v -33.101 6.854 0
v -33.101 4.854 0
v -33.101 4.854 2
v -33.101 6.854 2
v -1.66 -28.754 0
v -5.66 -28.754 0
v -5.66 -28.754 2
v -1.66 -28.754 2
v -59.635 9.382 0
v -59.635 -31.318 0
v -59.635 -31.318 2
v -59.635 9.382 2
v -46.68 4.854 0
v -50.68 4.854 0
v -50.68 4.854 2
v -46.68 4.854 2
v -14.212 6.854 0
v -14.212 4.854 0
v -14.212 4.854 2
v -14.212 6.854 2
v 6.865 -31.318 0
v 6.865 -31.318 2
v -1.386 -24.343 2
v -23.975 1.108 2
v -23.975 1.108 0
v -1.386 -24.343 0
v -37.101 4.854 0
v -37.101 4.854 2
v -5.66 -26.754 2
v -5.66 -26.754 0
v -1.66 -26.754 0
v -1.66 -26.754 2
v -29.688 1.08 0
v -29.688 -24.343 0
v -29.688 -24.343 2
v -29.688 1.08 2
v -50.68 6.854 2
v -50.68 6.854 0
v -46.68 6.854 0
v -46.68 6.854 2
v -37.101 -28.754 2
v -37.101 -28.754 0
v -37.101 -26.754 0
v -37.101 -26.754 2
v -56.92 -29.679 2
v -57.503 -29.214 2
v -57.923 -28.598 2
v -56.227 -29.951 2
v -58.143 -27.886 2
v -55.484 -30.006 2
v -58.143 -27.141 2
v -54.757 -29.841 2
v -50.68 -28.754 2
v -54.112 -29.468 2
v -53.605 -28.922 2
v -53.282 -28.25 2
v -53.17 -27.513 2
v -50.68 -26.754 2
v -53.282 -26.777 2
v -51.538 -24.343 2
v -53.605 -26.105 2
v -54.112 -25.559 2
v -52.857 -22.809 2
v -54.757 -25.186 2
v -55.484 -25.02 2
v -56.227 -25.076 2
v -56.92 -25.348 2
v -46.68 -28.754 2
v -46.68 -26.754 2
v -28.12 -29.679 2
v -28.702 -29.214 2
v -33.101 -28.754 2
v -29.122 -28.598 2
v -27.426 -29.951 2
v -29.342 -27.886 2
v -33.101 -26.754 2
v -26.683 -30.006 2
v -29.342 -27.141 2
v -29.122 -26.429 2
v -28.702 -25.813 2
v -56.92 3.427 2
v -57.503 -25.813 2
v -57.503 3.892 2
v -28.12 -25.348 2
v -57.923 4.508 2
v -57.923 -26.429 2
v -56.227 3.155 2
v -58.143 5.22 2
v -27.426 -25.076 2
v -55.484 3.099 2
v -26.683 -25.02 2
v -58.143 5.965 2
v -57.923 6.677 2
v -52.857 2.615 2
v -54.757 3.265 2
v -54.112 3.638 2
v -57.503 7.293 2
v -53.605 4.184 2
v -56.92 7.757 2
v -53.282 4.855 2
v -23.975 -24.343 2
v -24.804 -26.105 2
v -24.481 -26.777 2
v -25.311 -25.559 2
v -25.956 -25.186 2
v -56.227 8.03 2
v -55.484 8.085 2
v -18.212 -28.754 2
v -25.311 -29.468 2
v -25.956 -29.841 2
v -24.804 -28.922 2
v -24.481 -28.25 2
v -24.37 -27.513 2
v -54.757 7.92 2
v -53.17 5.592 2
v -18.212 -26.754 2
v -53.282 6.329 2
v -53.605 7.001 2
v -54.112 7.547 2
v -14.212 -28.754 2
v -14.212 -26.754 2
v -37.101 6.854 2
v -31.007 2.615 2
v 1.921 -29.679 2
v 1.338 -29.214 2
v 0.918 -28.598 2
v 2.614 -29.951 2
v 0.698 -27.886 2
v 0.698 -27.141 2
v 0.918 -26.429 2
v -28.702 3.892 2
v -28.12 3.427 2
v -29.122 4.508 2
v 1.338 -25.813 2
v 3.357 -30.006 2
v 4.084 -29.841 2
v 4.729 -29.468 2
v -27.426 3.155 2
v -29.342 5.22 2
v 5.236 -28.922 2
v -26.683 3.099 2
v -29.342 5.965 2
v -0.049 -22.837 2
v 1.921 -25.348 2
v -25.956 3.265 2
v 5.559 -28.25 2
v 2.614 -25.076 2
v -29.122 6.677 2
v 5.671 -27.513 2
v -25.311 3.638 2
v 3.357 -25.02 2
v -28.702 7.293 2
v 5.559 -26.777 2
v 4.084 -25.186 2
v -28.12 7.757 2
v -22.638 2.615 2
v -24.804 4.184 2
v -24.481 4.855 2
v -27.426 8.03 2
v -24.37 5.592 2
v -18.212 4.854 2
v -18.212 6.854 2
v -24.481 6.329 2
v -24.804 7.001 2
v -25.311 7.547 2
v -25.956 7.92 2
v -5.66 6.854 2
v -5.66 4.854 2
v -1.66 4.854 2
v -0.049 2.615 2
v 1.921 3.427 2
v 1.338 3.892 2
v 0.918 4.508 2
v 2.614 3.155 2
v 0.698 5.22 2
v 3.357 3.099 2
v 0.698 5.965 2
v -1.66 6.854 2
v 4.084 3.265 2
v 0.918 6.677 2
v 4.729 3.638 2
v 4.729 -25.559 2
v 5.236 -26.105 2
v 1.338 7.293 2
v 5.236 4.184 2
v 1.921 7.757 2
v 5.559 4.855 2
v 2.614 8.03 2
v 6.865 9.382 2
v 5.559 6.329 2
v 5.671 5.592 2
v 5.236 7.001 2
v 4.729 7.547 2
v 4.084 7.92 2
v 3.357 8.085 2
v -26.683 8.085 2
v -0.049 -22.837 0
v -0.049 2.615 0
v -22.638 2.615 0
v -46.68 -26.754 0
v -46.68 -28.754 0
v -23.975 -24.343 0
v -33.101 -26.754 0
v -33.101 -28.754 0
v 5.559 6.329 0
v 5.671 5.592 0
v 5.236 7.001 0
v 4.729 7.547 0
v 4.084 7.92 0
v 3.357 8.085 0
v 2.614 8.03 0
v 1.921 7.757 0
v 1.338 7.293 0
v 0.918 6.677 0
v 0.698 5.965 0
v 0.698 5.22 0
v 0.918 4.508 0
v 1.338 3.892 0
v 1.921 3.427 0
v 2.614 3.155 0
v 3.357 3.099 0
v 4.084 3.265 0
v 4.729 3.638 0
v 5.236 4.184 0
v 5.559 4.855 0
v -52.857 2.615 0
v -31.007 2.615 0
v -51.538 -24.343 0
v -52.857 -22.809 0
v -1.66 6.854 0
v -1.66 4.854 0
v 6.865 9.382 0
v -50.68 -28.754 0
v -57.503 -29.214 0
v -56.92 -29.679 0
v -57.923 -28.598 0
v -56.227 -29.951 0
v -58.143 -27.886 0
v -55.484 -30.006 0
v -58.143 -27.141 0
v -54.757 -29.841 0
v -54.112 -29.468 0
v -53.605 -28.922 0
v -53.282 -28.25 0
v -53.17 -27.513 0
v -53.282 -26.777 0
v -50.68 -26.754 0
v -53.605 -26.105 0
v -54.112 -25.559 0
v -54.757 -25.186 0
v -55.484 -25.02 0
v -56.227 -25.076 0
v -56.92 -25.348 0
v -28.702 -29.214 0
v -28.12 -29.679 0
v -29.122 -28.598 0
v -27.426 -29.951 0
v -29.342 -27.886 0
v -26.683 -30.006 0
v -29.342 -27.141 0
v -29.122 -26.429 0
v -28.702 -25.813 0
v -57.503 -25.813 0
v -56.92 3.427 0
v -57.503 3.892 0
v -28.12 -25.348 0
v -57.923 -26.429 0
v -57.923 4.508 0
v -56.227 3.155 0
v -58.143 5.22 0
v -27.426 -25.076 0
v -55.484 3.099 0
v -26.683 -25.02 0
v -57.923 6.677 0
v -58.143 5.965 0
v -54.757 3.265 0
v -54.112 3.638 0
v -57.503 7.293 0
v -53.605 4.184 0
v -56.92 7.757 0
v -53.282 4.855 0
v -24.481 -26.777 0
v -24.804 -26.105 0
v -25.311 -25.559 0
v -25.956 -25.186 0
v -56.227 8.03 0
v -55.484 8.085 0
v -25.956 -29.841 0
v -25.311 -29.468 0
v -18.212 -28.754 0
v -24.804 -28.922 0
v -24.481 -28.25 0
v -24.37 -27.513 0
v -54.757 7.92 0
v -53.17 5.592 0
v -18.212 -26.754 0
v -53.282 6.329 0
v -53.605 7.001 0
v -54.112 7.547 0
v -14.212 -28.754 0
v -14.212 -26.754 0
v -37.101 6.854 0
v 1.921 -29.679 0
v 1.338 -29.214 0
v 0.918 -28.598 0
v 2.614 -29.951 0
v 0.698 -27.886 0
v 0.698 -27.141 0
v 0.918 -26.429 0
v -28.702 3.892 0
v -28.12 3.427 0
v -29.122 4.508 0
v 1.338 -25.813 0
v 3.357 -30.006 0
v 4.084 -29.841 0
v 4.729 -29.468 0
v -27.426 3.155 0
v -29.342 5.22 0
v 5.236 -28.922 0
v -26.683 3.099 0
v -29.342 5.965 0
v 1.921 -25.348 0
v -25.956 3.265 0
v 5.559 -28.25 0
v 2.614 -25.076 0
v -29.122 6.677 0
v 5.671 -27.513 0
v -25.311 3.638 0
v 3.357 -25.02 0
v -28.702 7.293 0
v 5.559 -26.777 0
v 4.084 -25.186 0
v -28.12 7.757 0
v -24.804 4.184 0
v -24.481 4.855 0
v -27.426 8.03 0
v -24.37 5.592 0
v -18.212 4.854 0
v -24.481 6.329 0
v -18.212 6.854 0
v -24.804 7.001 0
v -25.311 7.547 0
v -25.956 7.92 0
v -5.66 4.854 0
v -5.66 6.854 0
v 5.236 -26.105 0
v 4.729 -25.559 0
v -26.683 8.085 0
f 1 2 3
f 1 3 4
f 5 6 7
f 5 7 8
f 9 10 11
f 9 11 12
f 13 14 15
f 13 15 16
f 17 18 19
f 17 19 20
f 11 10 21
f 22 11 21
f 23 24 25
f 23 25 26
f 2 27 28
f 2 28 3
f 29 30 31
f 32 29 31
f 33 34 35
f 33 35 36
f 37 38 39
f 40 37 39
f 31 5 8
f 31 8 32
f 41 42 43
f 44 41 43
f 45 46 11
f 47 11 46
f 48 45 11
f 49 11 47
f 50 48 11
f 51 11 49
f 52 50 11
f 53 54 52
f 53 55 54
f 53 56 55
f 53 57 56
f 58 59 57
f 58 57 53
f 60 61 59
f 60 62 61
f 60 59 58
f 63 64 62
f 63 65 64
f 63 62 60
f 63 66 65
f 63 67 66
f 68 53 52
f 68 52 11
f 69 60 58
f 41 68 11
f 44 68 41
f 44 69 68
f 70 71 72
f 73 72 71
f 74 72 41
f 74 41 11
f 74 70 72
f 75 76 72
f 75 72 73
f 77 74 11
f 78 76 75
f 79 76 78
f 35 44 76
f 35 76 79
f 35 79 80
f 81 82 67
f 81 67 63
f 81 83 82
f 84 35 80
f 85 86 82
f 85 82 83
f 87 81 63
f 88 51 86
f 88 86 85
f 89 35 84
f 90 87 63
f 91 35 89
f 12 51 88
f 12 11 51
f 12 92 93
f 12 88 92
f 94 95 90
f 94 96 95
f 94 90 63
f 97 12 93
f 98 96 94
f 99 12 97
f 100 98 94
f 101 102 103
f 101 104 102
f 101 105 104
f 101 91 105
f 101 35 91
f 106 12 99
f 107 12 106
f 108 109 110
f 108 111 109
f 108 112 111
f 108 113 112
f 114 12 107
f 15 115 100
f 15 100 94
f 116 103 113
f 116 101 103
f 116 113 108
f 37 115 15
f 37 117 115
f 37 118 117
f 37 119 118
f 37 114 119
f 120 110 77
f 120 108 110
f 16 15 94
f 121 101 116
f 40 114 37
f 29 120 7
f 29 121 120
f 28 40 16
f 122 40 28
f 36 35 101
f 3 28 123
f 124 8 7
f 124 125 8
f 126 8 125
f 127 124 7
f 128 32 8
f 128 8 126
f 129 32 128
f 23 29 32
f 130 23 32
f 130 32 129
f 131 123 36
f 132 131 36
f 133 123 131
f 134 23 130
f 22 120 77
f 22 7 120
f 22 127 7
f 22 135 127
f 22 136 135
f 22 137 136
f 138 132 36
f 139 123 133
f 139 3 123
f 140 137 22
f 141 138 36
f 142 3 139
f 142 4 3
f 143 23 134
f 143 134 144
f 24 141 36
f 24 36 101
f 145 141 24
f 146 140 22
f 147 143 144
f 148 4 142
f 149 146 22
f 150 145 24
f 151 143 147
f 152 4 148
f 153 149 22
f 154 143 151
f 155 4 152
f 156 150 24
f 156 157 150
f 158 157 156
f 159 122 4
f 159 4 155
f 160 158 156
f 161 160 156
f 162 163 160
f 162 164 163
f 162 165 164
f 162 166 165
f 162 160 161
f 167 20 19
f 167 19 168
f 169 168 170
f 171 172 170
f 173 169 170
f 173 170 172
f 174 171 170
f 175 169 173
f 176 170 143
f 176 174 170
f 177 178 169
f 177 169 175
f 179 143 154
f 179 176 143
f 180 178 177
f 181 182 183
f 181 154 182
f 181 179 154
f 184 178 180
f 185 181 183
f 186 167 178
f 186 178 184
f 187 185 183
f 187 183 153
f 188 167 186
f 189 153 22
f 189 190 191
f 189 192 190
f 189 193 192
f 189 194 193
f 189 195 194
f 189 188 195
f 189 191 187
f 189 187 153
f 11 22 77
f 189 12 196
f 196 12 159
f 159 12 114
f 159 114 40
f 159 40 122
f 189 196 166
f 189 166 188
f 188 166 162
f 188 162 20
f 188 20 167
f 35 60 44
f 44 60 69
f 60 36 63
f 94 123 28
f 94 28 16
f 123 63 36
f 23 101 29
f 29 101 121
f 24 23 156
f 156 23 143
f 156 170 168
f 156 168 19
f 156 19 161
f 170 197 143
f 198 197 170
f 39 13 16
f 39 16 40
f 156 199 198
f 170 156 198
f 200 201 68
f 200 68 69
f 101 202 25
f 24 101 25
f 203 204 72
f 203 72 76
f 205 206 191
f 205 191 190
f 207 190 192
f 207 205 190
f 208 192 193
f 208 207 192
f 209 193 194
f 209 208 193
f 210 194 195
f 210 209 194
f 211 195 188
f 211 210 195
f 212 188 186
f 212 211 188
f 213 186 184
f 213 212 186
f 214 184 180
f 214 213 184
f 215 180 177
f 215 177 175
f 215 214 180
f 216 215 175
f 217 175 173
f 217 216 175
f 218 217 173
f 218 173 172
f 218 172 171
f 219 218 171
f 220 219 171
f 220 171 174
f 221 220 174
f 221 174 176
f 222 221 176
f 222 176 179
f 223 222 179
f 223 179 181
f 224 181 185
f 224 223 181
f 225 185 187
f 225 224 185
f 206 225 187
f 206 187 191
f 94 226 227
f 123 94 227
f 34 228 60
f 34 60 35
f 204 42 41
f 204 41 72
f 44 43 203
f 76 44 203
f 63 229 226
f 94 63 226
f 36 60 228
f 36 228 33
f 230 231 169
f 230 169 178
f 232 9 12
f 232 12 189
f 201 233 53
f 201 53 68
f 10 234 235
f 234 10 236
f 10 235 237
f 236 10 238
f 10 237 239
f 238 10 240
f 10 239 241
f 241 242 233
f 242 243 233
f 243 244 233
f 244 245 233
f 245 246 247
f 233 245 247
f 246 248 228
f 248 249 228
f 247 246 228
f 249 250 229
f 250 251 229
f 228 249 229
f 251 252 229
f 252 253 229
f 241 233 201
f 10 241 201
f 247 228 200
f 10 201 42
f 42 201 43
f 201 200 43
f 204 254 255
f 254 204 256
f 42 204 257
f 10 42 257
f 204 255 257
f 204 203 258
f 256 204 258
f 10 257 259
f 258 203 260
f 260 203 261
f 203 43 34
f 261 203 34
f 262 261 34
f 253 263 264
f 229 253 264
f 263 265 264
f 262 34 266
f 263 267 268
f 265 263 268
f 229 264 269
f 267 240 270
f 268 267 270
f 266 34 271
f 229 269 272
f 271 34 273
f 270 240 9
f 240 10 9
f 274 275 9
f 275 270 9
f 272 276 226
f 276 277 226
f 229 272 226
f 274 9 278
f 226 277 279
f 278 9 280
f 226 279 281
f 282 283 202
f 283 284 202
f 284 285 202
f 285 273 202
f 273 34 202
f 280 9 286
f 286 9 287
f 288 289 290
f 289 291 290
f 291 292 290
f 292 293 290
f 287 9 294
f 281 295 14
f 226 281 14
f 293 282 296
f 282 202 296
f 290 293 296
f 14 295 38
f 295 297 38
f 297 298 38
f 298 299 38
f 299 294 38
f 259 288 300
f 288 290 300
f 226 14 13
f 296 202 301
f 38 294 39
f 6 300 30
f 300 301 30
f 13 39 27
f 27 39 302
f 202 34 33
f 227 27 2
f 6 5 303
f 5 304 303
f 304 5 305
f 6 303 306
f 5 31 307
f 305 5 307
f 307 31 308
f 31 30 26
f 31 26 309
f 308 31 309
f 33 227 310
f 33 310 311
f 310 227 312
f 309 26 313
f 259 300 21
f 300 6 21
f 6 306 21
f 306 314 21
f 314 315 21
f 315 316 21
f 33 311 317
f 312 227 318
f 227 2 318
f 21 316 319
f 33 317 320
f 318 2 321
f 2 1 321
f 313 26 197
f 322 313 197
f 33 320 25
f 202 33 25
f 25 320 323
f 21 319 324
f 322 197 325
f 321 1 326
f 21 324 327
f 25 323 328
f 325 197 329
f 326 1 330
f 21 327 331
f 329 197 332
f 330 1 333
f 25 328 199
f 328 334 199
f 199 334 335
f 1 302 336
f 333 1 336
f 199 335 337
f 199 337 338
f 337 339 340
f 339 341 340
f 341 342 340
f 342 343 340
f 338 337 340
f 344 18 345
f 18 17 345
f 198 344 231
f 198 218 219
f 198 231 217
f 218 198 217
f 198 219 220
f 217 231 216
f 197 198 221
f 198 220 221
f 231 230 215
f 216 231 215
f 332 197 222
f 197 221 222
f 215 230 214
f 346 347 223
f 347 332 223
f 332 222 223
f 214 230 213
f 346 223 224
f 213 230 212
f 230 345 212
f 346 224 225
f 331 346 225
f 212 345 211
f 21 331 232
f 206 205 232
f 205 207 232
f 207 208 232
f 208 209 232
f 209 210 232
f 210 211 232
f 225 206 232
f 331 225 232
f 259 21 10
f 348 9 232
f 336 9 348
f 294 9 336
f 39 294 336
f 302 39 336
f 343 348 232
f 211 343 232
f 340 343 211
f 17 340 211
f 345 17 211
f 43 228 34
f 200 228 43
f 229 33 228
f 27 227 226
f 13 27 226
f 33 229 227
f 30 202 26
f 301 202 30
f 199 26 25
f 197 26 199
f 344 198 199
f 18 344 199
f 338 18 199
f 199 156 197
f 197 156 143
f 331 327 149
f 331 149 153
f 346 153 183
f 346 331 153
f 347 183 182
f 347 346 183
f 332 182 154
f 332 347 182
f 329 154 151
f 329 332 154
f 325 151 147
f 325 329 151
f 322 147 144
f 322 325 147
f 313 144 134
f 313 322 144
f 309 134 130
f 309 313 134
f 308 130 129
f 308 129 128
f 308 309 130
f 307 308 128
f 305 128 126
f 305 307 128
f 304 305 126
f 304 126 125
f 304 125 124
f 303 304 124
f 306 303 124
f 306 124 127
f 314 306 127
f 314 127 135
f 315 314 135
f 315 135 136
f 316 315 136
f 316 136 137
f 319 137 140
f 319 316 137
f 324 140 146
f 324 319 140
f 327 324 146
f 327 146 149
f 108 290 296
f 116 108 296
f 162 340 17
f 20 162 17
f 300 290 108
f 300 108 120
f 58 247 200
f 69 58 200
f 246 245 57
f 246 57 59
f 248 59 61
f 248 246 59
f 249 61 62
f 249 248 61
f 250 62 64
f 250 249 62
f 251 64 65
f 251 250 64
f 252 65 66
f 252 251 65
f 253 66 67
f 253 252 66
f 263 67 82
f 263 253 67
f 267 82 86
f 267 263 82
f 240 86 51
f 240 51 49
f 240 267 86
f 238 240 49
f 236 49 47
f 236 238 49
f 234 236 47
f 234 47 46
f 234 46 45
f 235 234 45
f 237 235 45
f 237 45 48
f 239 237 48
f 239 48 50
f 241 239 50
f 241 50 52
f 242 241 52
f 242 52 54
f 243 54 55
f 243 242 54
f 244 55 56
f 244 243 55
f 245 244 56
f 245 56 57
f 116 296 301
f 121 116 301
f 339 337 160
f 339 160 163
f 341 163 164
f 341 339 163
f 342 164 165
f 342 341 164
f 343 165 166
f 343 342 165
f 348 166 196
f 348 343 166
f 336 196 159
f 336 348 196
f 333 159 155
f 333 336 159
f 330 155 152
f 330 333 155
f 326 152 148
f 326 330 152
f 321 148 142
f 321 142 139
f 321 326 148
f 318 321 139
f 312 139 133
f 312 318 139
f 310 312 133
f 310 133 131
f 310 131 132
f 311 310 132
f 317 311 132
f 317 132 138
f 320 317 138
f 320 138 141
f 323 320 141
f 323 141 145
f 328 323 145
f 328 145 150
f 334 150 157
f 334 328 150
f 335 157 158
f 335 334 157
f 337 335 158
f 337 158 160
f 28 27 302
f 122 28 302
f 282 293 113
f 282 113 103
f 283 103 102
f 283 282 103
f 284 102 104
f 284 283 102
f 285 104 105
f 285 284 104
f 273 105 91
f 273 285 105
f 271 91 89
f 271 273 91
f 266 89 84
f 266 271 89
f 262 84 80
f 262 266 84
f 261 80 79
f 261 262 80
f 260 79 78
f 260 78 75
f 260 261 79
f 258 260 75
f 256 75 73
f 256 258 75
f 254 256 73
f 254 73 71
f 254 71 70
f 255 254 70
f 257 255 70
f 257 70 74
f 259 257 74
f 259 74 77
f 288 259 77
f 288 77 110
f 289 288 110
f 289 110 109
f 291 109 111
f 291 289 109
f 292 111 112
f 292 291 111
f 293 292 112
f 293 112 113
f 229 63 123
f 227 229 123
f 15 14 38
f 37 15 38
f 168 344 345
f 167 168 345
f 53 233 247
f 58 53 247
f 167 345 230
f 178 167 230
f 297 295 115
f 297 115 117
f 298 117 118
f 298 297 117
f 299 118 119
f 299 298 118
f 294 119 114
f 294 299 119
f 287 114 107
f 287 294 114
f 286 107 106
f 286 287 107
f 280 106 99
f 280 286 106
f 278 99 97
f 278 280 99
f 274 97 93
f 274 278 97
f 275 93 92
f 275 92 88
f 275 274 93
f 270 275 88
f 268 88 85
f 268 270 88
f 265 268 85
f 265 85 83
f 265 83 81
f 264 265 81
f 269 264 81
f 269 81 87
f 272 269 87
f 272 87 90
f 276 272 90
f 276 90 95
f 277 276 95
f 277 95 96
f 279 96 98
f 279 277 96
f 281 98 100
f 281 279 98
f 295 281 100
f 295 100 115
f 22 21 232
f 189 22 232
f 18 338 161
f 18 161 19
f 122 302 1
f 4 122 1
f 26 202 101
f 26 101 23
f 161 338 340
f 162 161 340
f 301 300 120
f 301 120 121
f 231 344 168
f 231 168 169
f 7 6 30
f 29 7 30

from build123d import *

# Parameters (mm, degrees)
F0_W     = 66.5
F0_H     = 40.7
F0_R     = 2.5
F0_W_2   = 4
F0_H_2   = 2
F0_W_3   = 23.1688134372
F0_H_3   = 26.9576453138
F0_W_4   = 23.9260006735
F1_DEPTH = 2
F0_H_4   = 1.6511697322
F0_H_5   = 1.6511703735
F2_E4_W  = 35.5458655395
F2_E4_H  = 2
F3_DEPTH = 1
F4_E5_W  = 36.0439752121
F4_E5_H  = 2
F5_DEPTH = 1


with BuildPart() as f1:
    # F0 (on Top) → F1 (new body)
    with BuildSketch(Plane.XY):
        with Locations((-26.3848016039, -10.9677366539)):
            Rectangle(F0_W, F0_H)
        with Locations((-55.6704513729, -27.5134705007)):
            Circle(F0_R, mode=Mode.SUBTRACT)
        with Locations((-48.6798131391, -27.7539507372)):
            Rectangle(F0_W_2, F0_H_2, mode=Mode.SUBTRACT)
        with Locations((-35.1007831245, -27.7539507372)):
            Rectangle(F0_W_2, F0_H_2, mode=Mode.SUBTRACT)
        with Locations((-26.8697291613, -27.5134705007)):
            Circle(F0_R, mode=Mode.SUBTRACT)
        with Locations((-16.2120581007, -27.7539507372)):
            Rectangle(F0_W_2, F0_H_2, mode=Mode.SUBTRACT)
        with Locations((-3.6603234261, -27.7539507372)):
            Rectangle(F0_W_2, F0_H_2, mode=Mode.SUBTRACT)
        with Locations((3.1705482397, -27.5134705007)):
            Circle(F0_R, mode=Mode.SUBTRACT)
        with Locations((-55.6704513729, 5.5923270993)):
            Circle(F0_R, mode=Mode.SUBTRACT)
        with Locations((-48.6798131391, 5.8541836441)):
            Rectangle(F0_W_2, F0_H_2, mode=Mode.SUBTRACT)
        with Locations((-41.2725005299, -10.8643159037)):
            Rectangle(F0_W_3, F0_H_3, mode=Mode.SUBTRACT)
        with Locations((-35.1007831245, 5.8541836441)):
            Rectangle(F0_W_2, F0_H_2, mode=Mode.SUBTRACT)
        with Locations((-26.8697291613, 5.5923270993)):
            Circle(F0_R, mode=Mode.SUBTRACT)
        with Locations((-12.0121349685, -10.8643159037)):
            Rectangle(F0_W_4, F0_H_3, mode=Mode.SUBTRACT)
        with Locations((-16.2120581007, 5.8541836441)):
            Rectangle(F0_W_2, F0_H_2, mode=Mode.SUBTRACT)
        with Locations((-3.6603234261, 5.8541836441)):
            Rectangle(F0_W_2, F0_H_2, mode=Mode.SUBTRACT)
        with Locations((3.1705482397, 5.5923270993)):
            Circle(F0_R, mode=Mode.SUBTRACT)
    extrude(amount=F1_DEPTH)

    # F2_E4 (on explicit) → F3 (join, symmetric)
    with BuildSketch(Plane(origin=(-52.8569072485, -24.3431385607, 0), x_dir=(0.6518005142, 0.7583904599, 0), z_dir=(0.7583904599, -0.6518005142, 0))):
        with Locations((17.7729327698, 1)):
            Rectangle(F2_E4_W, F2_E4_H)
    extrude(amount=F3_DEPTH, both=True)

    # F4_E5 (on explicit) → F5 (join, symmetric)
    with BuildSketch(Plane(origin=(-23.9751353052, 2.6145067532, 0), x_dir=(0.6638002754, -0.7479098838, 0), z_dir=(-0.7479098838, -0.6638002754, 0))):
        with Locations((18.0219876061, 1)):
            Rectangle(F4_E5_W, F4_E5_H)
    extrude(amount=F5_DEPTH, both=True)


with BuildPart() as f1b:
    # F0 (on Top) → F1, piece 2 (new body)
    with BuildSketch(Plane.XY):
        with Locations((-3.6603234261, 39.867881812)):
            Rectangle(F0_W_2, F0_H_4)
    extrude(amount=F1_DEPTH)


with BuildPart() as f1c:
    # F0 (on Top) → F1, piece 3 (new body)
    with BuildSketch(Plane.XY):
        with Locations((-3.6603234261, -61.797210648)):
            Rectangle(F0_W_2, F0_H_5)
    extrude(amount=F1_DEPTH)


solid = f1.part
